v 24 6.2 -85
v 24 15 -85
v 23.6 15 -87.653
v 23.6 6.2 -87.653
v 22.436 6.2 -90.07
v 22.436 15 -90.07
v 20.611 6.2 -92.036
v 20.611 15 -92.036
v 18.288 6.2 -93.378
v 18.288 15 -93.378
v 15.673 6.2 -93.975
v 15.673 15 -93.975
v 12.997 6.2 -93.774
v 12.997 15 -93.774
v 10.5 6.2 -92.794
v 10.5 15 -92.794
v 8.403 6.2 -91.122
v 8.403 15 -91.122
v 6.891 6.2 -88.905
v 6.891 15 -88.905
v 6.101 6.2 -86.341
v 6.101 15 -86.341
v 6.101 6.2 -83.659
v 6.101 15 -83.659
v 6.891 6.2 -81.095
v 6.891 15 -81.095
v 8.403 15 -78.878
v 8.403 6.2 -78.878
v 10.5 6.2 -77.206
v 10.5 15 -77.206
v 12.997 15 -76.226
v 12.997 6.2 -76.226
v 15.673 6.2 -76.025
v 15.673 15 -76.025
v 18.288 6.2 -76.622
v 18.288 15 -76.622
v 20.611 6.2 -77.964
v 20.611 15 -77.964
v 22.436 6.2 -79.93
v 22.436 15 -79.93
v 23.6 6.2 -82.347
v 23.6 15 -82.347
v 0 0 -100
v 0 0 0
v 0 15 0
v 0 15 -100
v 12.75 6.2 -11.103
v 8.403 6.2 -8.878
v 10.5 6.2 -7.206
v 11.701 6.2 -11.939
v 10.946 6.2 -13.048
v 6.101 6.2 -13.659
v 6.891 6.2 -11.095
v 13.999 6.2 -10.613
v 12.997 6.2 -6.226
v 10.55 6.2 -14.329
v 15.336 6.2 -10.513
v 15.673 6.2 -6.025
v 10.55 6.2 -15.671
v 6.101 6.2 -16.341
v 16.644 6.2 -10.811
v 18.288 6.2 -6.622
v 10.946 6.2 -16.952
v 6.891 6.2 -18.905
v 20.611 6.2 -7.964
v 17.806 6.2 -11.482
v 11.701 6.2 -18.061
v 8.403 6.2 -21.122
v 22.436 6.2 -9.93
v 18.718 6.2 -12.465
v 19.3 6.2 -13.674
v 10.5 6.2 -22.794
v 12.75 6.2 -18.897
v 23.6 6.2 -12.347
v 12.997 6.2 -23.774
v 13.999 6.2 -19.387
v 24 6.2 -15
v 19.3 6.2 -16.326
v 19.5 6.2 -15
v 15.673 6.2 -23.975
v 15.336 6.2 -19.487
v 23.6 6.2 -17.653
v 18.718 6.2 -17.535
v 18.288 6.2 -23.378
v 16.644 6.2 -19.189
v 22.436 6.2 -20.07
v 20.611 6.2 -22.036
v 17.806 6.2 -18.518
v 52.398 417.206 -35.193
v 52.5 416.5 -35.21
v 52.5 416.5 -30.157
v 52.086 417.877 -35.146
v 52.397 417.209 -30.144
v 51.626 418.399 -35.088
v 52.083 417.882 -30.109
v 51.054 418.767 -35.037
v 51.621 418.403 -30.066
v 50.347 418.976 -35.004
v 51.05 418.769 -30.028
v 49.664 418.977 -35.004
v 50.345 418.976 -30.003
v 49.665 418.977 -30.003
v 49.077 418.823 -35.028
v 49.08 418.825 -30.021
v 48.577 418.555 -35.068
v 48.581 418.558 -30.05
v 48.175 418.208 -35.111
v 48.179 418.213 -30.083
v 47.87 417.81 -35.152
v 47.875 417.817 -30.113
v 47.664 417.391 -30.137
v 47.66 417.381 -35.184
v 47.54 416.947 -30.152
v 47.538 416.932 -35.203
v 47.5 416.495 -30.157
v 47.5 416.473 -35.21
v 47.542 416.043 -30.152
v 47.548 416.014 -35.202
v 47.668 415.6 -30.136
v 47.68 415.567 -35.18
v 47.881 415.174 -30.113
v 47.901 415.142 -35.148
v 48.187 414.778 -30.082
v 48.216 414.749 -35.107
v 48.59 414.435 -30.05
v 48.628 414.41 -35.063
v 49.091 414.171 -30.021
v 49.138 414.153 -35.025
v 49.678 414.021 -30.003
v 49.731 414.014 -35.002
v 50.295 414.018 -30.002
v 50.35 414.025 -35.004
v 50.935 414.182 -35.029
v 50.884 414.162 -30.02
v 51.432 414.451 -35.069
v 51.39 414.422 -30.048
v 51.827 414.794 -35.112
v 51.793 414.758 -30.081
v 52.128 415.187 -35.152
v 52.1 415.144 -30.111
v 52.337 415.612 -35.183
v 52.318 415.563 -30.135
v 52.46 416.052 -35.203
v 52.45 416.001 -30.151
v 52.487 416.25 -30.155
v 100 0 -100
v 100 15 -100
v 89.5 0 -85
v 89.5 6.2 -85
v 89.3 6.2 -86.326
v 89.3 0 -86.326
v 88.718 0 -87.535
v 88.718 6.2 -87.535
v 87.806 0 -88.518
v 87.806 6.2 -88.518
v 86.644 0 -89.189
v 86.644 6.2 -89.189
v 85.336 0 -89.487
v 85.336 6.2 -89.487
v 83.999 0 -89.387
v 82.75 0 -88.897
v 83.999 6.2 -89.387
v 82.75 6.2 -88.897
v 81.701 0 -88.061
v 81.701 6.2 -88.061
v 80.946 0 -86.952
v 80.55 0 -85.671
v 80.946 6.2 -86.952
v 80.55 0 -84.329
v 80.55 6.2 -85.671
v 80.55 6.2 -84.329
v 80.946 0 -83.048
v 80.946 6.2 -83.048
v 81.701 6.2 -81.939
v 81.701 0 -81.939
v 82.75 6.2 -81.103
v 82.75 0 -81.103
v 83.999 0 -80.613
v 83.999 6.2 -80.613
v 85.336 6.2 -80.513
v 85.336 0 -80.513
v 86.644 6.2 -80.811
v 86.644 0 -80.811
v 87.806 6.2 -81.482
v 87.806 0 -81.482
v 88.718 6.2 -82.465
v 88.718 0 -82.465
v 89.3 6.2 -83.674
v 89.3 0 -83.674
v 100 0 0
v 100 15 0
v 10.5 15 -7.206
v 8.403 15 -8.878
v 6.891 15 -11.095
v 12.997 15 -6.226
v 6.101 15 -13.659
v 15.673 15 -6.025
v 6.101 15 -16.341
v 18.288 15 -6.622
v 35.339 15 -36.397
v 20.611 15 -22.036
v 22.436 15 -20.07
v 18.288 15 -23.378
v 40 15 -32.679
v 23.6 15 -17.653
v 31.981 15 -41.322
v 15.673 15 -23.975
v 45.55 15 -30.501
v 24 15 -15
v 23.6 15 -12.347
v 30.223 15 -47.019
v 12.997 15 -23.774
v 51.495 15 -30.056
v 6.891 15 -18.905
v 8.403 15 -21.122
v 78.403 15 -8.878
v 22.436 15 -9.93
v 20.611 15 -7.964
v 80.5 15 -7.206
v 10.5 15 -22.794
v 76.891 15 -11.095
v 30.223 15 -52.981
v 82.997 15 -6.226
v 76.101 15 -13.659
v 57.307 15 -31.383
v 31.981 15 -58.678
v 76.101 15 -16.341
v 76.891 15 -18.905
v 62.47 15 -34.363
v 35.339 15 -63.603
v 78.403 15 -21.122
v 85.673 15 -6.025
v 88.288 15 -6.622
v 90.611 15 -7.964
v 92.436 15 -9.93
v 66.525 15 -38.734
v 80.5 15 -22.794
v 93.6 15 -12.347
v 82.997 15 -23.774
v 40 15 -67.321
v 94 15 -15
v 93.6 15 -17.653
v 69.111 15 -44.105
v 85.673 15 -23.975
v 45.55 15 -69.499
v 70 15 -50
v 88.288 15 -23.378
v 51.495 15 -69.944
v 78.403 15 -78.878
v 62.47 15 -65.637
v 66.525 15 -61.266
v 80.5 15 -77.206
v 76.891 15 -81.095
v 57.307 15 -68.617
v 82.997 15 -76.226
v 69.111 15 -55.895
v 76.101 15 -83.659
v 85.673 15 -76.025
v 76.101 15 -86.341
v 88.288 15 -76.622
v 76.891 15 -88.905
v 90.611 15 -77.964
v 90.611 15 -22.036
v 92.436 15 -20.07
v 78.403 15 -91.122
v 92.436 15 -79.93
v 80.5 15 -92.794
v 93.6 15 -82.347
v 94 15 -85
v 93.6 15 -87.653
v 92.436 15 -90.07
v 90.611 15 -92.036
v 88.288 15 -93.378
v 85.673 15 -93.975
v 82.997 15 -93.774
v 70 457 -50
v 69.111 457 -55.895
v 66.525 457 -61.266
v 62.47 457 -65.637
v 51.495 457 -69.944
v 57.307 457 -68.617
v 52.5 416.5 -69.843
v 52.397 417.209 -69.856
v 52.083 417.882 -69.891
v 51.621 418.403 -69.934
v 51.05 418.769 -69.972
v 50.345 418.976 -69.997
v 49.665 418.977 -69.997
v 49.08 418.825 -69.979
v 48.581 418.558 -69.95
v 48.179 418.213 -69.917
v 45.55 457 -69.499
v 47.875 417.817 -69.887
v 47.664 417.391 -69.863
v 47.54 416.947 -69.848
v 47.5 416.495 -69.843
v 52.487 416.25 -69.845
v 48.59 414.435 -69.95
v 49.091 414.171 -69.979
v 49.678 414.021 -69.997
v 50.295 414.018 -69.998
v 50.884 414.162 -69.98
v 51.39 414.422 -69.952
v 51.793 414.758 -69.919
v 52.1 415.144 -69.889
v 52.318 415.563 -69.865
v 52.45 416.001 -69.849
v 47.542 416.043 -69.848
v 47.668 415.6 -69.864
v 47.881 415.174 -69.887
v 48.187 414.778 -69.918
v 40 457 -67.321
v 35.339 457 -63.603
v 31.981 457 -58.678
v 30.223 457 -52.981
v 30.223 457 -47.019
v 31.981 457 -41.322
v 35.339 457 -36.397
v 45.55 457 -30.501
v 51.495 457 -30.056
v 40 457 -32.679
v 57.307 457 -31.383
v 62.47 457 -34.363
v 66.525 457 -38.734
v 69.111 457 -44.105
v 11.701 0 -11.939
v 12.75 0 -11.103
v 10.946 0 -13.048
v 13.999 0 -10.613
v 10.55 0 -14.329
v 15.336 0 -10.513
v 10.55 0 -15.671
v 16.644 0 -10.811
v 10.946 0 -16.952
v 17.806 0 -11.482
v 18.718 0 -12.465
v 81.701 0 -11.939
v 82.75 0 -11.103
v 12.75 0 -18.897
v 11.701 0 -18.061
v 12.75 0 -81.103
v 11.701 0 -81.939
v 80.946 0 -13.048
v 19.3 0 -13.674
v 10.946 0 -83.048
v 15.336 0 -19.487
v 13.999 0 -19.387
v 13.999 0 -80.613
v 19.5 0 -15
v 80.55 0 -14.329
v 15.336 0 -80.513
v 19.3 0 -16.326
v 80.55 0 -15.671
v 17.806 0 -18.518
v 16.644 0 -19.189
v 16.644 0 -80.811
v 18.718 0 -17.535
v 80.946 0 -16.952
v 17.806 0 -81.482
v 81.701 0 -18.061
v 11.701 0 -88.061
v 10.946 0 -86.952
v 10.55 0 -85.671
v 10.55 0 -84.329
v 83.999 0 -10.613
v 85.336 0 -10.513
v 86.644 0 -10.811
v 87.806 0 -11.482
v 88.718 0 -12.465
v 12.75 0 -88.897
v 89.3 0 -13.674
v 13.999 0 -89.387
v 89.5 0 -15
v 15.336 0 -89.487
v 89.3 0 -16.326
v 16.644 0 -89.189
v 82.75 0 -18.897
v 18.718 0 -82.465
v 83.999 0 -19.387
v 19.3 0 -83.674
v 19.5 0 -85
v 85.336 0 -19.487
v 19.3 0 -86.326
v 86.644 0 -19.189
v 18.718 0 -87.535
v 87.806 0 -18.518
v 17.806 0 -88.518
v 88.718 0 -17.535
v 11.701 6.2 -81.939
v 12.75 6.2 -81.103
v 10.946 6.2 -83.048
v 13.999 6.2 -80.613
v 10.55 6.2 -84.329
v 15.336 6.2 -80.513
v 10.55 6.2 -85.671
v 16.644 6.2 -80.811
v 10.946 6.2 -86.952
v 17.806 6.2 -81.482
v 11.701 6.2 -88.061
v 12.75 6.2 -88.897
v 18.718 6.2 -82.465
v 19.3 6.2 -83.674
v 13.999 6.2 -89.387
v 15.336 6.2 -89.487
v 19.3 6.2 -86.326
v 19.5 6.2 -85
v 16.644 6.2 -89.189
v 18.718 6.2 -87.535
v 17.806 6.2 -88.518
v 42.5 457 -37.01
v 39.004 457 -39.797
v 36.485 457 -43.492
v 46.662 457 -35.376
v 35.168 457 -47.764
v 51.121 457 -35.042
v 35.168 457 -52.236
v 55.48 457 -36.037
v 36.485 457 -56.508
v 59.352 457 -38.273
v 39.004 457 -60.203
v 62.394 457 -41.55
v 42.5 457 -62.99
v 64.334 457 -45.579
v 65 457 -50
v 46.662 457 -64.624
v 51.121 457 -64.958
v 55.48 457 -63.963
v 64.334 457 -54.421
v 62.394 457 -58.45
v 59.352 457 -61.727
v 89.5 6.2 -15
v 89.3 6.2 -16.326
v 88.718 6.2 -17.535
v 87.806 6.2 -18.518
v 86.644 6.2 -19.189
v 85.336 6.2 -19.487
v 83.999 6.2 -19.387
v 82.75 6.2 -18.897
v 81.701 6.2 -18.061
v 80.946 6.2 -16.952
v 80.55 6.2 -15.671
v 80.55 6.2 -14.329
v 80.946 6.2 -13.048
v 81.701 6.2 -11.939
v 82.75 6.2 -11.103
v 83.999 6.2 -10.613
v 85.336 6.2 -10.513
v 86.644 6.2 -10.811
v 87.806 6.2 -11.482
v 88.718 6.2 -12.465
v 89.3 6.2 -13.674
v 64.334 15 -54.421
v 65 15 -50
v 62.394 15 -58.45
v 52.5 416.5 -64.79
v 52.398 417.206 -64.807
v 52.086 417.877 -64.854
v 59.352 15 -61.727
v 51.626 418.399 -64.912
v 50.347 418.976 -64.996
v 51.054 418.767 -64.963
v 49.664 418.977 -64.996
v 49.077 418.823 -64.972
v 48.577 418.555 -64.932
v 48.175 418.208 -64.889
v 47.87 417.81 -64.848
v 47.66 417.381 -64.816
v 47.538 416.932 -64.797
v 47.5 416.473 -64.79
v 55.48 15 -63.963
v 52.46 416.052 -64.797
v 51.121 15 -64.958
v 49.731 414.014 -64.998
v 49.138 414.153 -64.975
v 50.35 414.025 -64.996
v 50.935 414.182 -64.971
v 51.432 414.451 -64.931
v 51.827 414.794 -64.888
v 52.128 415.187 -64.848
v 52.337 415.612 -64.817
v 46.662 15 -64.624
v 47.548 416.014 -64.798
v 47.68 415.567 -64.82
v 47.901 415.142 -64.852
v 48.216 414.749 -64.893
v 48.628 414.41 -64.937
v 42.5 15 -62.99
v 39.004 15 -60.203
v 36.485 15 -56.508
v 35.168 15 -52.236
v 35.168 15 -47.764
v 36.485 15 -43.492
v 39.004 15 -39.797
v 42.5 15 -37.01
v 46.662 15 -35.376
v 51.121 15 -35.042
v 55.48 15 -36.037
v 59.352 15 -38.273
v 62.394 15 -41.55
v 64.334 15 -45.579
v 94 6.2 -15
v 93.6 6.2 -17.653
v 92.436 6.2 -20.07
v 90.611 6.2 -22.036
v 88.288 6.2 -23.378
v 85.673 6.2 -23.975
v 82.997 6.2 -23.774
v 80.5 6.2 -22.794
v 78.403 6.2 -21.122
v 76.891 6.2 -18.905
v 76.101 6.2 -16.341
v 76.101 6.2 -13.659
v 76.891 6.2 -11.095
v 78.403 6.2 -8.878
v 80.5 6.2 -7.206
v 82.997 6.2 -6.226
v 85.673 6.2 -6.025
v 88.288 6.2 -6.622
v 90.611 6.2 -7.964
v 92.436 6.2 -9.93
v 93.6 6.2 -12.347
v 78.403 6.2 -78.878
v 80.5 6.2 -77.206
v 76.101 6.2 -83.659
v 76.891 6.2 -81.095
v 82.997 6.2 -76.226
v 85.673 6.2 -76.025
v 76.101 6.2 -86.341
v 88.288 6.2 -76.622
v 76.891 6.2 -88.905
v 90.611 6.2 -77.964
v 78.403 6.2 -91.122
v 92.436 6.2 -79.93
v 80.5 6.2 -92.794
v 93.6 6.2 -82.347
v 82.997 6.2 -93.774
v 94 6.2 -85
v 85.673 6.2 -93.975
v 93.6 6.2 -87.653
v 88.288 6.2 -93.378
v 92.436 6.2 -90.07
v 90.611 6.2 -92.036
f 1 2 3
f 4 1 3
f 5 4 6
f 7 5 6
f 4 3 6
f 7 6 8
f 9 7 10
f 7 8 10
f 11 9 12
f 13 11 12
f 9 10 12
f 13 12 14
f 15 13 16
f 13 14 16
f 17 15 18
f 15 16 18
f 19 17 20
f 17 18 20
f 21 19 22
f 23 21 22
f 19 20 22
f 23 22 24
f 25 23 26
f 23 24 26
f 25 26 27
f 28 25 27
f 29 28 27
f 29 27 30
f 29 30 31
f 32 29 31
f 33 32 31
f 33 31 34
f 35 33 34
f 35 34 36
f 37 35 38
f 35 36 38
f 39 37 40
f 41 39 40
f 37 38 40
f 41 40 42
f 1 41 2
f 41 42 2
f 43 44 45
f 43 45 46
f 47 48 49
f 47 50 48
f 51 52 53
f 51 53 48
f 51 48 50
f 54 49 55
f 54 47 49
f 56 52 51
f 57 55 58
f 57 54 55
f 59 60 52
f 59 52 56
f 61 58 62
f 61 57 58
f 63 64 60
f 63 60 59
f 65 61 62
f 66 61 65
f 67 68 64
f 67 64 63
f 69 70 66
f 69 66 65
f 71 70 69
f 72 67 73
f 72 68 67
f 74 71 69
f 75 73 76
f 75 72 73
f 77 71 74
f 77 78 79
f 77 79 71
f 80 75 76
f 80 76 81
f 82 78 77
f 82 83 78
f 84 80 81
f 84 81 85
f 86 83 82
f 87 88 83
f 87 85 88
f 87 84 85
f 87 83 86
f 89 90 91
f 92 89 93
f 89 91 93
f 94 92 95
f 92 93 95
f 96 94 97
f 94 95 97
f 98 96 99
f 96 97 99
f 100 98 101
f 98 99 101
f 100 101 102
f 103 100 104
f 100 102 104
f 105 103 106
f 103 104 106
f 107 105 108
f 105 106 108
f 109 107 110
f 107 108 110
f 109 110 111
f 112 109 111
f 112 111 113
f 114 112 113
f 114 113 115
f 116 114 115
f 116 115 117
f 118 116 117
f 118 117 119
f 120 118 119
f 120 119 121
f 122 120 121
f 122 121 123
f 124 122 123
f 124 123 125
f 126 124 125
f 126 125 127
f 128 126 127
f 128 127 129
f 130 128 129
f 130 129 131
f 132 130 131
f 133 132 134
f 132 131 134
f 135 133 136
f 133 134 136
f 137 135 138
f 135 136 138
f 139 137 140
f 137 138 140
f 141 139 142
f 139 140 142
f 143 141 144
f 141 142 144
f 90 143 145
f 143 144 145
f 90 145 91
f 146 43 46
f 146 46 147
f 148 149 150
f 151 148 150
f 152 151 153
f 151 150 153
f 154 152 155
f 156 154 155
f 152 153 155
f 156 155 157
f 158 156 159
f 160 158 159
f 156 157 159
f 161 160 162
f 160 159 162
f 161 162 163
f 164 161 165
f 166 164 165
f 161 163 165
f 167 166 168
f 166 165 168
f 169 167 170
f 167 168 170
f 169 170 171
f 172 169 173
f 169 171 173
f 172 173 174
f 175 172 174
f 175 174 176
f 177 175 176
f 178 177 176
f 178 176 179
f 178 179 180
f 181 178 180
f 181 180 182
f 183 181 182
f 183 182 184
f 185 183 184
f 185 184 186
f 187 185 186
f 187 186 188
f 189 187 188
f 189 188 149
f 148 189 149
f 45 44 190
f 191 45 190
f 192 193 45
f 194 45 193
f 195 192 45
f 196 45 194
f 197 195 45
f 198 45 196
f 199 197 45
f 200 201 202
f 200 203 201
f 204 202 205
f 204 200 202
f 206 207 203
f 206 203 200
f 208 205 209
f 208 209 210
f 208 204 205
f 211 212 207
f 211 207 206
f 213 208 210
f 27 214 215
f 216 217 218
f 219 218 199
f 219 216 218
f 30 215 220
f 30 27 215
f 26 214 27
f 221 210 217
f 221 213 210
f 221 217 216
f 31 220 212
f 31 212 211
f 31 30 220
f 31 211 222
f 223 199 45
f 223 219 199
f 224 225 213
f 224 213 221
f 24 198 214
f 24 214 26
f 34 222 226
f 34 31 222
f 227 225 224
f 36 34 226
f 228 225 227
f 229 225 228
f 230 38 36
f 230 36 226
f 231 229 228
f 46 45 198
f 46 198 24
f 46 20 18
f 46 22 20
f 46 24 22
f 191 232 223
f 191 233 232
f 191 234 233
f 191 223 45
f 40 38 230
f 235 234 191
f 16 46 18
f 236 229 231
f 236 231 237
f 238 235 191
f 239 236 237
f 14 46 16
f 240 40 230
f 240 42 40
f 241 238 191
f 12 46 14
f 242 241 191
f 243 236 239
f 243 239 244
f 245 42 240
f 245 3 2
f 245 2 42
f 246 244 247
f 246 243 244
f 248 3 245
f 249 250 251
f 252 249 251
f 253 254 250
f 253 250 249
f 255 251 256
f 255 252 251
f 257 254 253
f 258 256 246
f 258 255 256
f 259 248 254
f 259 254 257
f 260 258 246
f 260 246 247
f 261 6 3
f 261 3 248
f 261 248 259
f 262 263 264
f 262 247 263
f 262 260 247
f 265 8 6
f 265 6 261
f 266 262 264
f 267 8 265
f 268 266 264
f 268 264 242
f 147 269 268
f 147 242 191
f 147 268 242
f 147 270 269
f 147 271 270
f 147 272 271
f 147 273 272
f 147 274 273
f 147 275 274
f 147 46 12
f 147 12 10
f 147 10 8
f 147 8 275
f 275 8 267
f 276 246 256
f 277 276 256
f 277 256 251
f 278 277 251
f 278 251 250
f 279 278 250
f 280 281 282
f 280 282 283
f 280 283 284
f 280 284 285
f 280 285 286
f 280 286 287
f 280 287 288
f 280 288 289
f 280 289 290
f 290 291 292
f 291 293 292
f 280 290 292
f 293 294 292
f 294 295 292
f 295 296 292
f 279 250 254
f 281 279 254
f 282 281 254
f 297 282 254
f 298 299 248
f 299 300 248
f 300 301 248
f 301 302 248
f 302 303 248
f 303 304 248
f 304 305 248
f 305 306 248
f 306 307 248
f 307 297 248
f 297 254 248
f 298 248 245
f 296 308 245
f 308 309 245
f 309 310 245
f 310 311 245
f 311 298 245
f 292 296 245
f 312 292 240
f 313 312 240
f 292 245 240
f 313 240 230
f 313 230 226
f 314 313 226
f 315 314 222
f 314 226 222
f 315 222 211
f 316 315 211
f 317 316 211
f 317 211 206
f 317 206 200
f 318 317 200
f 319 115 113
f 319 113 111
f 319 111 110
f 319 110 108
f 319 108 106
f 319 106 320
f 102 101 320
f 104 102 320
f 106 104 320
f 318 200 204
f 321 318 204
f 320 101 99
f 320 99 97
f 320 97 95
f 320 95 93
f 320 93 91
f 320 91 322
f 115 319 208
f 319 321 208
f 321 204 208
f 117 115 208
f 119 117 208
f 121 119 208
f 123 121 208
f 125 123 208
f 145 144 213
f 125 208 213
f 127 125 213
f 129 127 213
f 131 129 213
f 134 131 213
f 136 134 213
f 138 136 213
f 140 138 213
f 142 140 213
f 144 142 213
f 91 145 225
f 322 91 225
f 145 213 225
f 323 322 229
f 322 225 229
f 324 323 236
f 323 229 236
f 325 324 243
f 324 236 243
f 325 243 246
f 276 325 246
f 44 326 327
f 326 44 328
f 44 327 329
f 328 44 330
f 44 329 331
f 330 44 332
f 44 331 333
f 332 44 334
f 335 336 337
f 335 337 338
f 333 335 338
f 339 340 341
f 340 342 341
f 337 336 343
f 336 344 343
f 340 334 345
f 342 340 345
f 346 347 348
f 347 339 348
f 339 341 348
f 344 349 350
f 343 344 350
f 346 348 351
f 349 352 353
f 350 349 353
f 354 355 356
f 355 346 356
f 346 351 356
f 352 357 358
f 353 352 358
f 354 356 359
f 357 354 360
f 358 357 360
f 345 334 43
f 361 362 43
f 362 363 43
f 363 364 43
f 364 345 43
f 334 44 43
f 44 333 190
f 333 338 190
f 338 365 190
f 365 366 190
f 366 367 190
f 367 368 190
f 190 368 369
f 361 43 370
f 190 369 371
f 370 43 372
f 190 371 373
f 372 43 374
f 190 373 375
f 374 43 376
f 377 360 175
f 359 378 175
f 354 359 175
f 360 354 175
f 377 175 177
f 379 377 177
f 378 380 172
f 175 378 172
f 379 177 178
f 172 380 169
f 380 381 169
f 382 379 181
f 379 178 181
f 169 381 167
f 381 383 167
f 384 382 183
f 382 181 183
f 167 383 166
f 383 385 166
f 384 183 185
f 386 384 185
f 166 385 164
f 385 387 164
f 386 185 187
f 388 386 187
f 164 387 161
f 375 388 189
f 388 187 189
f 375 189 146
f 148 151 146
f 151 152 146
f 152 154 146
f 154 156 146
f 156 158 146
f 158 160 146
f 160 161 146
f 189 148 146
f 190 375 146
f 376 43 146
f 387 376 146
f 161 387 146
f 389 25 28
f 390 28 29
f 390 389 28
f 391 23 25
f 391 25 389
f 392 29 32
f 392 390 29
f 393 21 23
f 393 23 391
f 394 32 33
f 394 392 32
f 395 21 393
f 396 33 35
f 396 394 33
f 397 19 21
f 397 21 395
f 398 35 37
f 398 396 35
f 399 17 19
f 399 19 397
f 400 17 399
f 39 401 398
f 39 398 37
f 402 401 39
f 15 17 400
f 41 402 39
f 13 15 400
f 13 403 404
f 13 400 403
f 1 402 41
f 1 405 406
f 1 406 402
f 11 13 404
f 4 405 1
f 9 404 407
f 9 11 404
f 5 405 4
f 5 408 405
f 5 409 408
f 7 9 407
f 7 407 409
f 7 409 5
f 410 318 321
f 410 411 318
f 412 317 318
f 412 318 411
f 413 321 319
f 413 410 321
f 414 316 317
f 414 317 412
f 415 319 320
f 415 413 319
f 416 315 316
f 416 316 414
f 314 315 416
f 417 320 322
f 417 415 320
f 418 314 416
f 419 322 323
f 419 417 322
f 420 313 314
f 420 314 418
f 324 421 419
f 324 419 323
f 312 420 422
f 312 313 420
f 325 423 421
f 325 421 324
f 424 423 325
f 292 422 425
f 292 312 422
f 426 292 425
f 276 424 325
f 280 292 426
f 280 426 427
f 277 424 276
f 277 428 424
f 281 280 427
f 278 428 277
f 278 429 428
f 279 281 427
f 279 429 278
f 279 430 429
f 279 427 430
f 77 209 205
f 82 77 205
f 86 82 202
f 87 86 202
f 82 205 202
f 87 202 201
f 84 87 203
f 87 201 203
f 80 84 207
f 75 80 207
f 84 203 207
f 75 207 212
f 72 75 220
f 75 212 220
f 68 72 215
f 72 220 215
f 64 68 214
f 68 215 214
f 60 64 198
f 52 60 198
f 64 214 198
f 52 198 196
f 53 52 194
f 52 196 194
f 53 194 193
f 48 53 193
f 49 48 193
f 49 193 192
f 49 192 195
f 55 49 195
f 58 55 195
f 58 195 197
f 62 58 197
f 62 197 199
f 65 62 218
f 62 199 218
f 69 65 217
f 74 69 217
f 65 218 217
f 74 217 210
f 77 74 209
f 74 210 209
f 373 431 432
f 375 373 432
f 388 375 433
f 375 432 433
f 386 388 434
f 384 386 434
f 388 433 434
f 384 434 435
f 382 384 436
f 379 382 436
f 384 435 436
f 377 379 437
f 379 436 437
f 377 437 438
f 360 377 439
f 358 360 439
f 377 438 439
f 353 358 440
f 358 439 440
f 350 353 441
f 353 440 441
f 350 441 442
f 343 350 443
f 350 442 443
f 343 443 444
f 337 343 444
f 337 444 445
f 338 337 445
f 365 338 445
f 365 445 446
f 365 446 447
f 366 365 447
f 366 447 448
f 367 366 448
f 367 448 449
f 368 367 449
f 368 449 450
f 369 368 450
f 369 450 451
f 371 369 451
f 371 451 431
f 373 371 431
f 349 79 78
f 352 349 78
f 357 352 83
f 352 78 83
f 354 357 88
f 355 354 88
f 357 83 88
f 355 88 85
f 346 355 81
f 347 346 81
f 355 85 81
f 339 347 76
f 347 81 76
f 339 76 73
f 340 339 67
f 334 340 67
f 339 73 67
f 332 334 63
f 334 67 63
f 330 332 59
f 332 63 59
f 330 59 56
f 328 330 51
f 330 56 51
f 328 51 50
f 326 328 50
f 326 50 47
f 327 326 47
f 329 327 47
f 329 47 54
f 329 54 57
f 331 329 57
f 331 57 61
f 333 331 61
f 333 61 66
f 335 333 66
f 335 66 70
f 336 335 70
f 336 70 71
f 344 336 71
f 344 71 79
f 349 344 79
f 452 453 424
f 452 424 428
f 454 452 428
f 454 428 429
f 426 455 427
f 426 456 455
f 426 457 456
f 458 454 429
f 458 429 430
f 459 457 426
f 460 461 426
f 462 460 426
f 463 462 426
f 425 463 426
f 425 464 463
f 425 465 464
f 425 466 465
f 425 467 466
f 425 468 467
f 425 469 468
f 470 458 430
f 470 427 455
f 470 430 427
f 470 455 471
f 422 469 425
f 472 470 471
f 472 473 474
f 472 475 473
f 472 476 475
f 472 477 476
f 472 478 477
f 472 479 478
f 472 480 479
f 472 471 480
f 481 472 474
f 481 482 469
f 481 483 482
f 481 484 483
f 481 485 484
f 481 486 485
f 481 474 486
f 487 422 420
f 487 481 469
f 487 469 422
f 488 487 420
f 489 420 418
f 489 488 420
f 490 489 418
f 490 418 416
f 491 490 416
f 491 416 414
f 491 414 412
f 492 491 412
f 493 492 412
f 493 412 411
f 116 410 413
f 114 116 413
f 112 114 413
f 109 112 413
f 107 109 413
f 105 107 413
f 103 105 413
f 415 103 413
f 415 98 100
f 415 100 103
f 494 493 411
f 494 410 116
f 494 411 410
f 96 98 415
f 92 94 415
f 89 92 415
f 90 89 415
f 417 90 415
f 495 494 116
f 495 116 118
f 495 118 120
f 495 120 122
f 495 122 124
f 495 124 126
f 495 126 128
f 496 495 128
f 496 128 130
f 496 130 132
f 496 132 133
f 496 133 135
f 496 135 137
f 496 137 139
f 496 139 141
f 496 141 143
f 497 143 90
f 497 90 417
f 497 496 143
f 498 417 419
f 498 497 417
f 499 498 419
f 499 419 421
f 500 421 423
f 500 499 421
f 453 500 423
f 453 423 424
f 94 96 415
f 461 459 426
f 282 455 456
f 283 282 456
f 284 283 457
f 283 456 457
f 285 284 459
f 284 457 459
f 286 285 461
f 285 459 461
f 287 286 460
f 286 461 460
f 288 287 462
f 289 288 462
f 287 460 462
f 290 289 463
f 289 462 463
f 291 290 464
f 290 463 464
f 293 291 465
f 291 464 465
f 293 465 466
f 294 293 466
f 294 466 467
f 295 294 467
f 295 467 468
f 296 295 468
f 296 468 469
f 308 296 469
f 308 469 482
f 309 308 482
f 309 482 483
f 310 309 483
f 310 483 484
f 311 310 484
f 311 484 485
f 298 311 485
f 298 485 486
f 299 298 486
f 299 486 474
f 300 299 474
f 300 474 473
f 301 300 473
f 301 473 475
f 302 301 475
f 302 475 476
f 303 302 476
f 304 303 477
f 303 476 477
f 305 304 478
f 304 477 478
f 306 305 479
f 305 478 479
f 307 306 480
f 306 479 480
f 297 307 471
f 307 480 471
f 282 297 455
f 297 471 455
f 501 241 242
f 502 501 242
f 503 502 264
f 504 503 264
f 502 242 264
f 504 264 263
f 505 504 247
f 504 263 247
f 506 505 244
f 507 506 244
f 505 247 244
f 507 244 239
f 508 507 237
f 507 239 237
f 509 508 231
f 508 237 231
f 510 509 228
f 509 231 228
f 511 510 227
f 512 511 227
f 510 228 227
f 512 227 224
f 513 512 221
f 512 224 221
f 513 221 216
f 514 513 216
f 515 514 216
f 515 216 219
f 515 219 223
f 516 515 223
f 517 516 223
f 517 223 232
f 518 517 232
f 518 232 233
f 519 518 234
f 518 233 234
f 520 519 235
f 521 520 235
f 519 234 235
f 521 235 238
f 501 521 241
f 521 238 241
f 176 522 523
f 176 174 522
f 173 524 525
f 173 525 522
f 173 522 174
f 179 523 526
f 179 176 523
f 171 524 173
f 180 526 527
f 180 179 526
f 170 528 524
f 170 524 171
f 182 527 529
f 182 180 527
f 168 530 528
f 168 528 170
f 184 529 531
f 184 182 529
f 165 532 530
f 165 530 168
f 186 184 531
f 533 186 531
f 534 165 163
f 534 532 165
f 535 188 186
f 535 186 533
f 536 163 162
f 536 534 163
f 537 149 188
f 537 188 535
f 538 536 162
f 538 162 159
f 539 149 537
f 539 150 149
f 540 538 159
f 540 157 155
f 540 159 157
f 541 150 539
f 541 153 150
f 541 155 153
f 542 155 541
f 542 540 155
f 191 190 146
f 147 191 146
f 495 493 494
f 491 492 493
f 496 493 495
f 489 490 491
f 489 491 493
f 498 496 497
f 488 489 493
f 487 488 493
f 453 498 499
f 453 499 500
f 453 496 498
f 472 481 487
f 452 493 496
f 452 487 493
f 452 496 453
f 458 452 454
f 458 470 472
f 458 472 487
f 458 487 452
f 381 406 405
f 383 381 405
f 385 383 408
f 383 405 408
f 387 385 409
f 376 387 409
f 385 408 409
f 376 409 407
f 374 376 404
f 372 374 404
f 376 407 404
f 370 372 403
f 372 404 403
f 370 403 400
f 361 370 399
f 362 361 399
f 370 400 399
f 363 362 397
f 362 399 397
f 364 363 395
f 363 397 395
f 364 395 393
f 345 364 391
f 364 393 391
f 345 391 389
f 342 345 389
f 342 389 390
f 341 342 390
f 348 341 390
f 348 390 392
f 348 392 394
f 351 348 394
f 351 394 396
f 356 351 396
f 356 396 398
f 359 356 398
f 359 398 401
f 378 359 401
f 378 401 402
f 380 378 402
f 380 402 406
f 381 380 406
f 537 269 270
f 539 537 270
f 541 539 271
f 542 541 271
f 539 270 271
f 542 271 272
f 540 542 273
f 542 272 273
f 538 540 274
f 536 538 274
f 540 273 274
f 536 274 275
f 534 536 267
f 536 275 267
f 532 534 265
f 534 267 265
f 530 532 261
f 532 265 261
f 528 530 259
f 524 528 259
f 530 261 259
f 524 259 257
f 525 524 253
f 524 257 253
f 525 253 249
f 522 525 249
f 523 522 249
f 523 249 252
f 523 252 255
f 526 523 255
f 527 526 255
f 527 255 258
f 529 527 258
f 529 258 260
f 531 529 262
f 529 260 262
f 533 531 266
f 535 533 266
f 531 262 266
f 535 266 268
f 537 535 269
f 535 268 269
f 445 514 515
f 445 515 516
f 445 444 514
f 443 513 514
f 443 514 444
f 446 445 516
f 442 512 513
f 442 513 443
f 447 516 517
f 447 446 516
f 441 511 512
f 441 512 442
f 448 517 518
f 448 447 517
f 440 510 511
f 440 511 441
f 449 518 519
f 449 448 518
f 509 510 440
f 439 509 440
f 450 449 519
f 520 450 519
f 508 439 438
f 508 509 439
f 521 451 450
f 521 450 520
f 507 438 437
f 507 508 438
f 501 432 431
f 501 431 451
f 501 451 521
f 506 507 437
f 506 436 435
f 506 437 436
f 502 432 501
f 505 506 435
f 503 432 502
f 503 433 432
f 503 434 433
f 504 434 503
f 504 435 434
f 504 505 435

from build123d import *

# Parameters (mm, degrees)
SKETCH4_W           = 100
SKETCH4_H           = 100
BOSS_EXTRUDE4_DEPTH = 15
SKETCH5_R           = 20
SKETCH5_R_2         = 15
BOSS_EXTRUDE5_DEPTH = 442
SKETCH8_R           = 2.5
CUT_EXTRUDE2_DEPTH  = 334
SKETCH9_R           = 4.5
CUT_EXTRUDE3_DEPTH  = 334
SKETCH10_R          = 9
CUT_EXTRUDE4_DEPTH  = 8.8


with BuildPart() as part:
    # Sketch4 → Boss-Extrude4 (new body)
    with BuildSketch(Plane(origin=(0, 0, 0), x_dir=(1, 0, 0), z_dir=(0, 1, 0))):
        with Locations((50, 50)):
            Rectangle(SKETCH4_W, SKETCH4_H)
    extrude(amount=BOSS_EXTRUDE4_DEPTH)

    # Sketch5 → Boss-Extrude5 (add)
    with BuildSketch(Plane(origin=(0, 15, 0), x_dir=(1, 0, 0), z_dir=(0, 1, 0))):
        with Locations((50, 50)):
            Circle(SKETCH5_R)
        with Locations((50, 50)):
            Circle(SKETCH5_R_2, mode=Mode.SUBTRACT)
    extrude(amount=BOSS_EXTRUDE5_DEPTH)

    # Sketch8 → Cut-Extrude2 (cut)
    with BuildSketch(Plane.XY):
        with Locations((50, 416.5)):
            Circle(SKETCH8_R)
    extrude(amount=-CUT_EXTRUDE2_DEPTH, mode=Mode.SUBTRACT)

    # Sketch9 → Cut-Extrude3 (cut)
    with BuildSketch(Plane(origin=(0, 15, 0), x_dir=(1, 0, 0), z_dir=(0, 1, 0))):
        with Locations((15, 85)):
            Circle(SKETCH9_R)
        with Locations((85, 85)):
            Circle(SKETCH9_R)
        with Locations((85, 15)):
            Circle(SKETCH9_R)
        with Locations((15, 15)):
            Circle(SKETCH9_R)
    extrude(amount=-CUT_EXTRUDE3_DEPTH, mode=Mode.SUBTRACT)

    # Sketch10 → Cut-Extrude4 (cut)
    with BuildSketch(Plane(origin=(0, 15, 0), x_dir=(1, 0, 0), z_dir=(0, 1, 0))):
        with Locations((15, 85)):
            Circle(SKETCH10_R)
        with Locations((85, 85)):
            Circle(SKETCH10_R)
        with Locations((85, 15)):
            Circle(SKETCH10_R)
        with Locations((15, 15)):
            Circle(SKETCH10_R)
    extrude(amount=-CUT_EXTRUDE4_DEPTH, mode=Mode.SUBTRACT)


solid = part.part
